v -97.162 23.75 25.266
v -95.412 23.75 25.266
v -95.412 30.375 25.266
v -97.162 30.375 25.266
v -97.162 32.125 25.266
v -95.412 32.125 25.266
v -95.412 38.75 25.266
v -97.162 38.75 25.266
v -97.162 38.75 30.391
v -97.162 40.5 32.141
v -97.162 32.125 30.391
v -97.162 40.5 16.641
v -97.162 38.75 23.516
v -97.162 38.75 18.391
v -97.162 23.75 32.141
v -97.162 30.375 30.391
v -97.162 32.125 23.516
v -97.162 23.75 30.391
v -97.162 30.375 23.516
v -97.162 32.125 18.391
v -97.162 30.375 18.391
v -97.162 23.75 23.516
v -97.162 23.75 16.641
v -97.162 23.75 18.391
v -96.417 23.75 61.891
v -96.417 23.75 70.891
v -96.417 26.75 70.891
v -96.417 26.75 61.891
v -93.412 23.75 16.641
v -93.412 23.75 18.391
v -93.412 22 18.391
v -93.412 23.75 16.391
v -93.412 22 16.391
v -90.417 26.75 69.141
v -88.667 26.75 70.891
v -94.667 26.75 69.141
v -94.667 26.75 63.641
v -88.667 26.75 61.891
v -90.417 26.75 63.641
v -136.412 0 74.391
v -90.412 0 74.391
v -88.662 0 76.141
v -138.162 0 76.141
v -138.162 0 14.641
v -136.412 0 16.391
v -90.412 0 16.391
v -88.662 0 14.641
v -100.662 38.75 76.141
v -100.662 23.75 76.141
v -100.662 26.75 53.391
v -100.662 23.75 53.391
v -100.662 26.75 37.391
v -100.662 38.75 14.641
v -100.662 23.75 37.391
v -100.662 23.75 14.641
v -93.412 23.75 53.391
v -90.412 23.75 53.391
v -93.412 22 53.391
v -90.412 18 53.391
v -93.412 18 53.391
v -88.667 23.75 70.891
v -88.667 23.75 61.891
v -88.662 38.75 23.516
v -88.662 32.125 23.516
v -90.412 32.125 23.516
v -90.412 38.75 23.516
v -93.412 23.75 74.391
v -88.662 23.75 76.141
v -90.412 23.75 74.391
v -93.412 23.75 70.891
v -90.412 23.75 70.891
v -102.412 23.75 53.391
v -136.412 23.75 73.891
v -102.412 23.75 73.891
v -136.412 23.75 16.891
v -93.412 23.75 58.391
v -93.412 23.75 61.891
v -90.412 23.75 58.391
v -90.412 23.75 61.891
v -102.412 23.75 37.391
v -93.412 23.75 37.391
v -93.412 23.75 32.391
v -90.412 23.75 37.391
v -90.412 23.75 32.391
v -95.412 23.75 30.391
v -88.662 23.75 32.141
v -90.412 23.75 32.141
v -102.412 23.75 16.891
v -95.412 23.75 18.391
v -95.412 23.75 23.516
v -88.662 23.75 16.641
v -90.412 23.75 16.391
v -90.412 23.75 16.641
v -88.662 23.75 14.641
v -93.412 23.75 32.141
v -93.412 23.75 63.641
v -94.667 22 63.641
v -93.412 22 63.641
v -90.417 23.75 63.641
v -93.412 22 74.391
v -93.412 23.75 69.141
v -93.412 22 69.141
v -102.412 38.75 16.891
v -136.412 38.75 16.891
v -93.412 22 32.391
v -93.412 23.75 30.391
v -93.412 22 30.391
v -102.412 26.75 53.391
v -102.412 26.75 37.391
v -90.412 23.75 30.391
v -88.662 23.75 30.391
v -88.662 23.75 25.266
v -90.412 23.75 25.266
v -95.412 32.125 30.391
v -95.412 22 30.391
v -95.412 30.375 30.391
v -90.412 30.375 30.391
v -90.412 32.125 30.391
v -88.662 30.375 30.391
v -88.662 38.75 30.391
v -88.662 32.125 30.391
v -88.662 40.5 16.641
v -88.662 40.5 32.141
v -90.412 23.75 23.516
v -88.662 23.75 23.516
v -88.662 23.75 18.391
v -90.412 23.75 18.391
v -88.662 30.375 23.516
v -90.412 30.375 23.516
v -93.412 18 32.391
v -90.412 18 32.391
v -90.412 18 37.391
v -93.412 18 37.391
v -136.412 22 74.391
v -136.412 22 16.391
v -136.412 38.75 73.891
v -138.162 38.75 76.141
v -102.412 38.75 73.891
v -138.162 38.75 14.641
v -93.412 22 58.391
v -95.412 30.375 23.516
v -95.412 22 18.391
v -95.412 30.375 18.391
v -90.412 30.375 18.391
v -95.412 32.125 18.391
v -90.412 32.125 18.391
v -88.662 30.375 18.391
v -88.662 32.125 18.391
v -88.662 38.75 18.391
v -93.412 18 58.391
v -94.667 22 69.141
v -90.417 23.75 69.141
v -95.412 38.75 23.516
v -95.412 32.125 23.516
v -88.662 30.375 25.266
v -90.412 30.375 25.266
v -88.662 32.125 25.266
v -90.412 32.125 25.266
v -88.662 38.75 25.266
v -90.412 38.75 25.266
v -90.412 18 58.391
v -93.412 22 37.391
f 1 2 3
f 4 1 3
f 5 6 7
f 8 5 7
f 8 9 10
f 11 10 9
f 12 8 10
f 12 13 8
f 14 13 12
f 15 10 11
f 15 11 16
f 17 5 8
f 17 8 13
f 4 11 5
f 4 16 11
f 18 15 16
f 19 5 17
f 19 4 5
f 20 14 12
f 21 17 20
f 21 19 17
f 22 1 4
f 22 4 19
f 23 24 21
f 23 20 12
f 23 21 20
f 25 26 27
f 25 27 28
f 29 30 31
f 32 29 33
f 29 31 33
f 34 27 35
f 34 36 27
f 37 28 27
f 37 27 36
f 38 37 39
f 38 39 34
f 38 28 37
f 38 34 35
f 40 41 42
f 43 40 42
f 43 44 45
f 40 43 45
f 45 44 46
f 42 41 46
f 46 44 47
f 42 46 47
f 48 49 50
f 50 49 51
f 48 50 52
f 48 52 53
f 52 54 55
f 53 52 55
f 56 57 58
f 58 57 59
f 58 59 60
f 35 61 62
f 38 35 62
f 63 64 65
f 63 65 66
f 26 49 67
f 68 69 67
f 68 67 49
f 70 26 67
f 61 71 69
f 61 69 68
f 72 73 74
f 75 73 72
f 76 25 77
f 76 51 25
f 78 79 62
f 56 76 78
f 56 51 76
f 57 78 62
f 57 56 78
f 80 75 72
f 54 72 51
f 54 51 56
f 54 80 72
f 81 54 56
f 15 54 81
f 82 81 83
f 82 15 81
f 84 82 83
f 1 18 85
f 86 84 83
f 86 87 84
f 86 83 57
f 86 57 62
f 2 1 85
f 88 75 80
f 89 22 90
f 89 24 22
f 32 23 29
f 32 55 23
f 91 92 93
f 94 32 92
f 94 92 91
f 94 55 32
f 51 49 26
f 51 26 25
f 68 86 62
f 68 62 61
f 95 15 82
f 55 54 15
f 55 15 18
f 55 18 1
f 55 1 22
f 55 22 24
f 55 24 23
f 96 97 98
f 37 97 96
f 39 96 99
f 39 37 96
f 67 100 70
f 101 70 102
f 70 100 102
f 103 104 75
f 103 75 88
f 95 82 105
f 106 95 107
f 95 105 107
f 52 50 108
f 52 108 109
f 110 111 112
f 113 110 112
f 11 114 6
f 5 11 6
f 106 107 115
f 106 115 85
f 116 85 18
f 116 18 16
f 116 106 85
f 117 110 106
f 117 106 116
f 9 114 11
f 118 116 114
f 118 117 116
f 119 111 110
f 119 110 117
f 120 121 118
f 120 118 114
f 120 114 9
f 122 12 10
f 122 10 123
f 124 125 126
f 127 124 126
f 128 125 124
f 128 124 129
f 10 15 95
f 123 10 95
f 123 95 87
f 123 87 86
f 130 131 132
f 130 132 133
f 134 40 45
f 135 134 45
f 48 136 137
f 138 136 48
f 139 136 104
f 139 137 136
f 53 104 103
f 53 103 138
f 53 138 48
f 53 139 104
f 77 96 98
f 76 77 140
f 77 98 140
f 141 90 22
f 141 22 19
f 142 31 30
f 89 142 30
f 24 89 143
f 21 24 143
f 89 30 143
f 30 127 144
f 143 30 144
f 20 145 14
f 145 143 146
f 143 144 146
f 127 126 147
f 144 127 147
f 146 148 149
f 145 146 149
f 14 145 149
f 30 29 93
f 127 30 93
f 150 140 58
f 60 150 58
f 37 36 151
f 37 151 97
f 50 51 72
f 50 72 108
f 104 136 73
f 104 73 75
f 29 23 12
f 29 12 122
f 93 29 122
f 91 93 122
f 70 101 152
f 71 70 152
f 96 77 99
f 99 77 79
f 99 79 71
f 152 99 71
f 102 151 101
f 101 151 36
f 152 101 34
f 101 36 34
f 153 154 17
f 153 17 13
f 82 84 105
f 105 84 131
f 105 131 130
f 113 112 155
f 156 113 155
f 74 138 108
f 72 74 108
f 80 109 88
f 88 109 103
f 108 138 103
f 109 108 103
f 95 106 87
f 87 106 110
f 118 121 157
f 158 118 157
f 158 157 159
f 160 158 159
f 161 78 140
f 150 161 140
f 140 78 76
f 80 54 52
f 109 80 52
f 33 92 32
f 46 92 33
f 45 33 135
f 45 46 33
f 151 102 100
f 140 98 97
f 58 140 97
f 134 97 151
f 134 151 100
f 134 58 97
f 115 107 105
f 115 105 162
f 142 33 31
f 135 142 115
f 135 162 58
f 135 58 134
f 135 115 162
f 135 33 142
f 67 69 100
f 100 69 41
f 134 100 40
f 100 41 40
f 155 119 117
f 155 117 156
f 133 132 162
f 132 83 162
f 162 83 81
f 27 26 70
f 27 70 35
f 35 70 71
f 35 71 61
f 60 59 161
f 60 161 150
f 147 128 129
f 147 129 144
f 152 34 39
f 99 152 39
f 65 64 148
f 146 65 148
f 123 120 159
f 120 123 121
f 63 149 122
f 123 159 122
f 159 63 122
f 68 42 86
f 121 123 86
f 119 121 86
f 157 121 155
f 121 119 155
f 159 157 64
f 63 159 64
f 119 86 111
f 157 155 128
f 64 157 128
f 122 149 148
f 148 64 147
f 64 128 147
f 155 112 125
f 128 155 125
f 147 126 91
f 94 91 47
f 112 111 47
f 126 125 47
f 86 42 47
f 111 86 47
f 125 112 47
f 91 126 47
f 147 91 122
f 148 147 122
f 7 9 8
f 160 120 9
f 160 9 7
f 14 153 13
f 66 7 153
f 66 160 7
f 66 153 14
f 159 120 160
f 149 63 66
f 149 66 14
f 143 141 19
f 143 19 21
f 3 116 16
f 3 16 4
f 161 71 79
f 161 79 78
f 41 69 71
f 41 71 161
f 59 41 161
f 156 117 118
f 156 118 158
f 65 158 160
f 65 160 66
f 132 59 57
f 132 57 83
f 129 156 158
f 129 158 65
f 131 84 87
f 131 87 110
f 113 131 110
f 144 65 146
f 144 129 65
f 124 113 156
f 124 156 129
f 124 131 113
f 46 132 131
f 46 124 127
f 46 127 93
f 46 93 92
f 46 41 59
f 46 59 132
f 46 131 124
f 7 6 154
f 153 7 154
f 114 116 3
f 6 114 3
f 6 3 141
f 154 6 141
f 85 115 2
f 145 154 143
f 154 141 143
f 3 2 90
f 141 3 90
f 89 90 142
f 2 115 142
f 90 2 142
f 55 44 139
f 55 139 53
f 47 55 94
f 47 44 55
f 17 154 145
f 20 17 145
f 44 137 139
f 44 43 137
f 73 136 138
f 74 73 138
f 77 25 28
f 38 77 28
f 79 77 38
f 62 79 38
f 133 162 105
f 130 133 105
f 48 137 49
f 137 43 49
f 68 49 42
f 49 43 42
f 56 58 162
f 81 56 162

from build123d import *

# Parameters (mm, degrees)
SKETCH1_W               = 49.5
SKETCH1_H               = 61.5
BOSS_EXTRUDE1_DEPTH     = 23.75
SKETCH2_W               = 46
SKETCH2_H               = 58
CUT_EXTRUDE1_DEPTH      = 22
SKETCH3_W               = 3
SKETCH3_H               = 16
CUT_EXTRUDE2_DEPTH      = 1.75
SKETCH7_W               = 3
SKETCH7_H               = 5
BOSS_EXTRUDE2_DEPTH     = 4
SKETCH11_W              = 37.5
SKETCH11_H              = 61.5
BOSS_EXTRUDE3_DEPTH     = 15
SKETCH12_W              = 34
SKETCH12_H              = 57
CUT_EXTRUDE3_DEPTH      = 15
SKETCH14_W              = 7.75
SKETCH14_H              = 9
BOSS_EXTRUDE4_DEPTH     = 3
SKETCH15_W              = 4.25
SKETCH15_H              = 5.5
CUT_EXTRUDE4_DEPTH      = 4.75
SKETCH16_W              = 8.5
SKETCH16_H              = 15.5
BOSS_EXTRUDE5_DEPTH     = 16.75
SKETCH17_W              = 5.125
SKETCH17_H              = 6.625
CUT_EXTRUDE5_DEPTH      = 8.5
CUT_EXTRUDE6_DEPTH      = 15
CUT_EXTRUDE6_DEPTH_BACK = 1.75
SKETCH18_W              = 5
SKETCH18_H              = 12
SKETCH20_W              = 16
SKETCH20_H              = 3
CUT_EXTRUDE7_DEPTH      = 1.75


with BuildPart() as part:
    # Sketch1 → Boss-Extrude1 (new body)
    with BuildSketch(Plane(origin=(0, 0, 0), x_dir=(1, 0, 0), z_dir=(0, 1, 0))):
        with Locations((-113.412024913, -45.391200727)):
            Rectangle(SKETCH1_W, SKETCH1_H)
    extrude(amount=BOSS_EXTRUDE1_DEPTH)

    # Sketch2 → Cut-Extrude1 (cut)
    with BuildSketch(Plane(origin=(0, 0, 0), x_dir=(-1, 0, 0), z_dir=(0, -1, 0))):
        with Locations((113.412024913, -45.391200727)):
            Rectangle(SKETCH2_W, SKETCH2_H)
    extrude(amount=-CUT_EXTRUDE1_DEPTH, mode=Mode.SUBTRACT)

    # Sketch3 → Cut-Extrude2 (cut)
    with BuildSketch(Plane(origin=(0, 22, 0), x_dir=(-1, 0, 0), z_dir=(0, -1, 0))):
        with Locations((91.912024913, -66.391200727)):
            Rectangle(SKETCH3_W, SKETCH3_H)
        with Locations((91.912024913, -24.391200727)):
            Rectangle(SKETCH3_W, SKETCH3_H)
        with Locations((91.912024913, -45.391200727)):
            Rectangle(SKETCH3_W, SKETCH3_H)
    extrude(amount=-CUT_EXTRUDE2_DEPTH, mode=Mode.SUBTRACT)

    # Sketch7 → Boss-Extrude2 (add)
    with BuildSketch(Plane(origin=(0, 22, 0), x_dir=(-1, 0, 0), z_dir=(0, -1, 0))):
        with Locations((91.912024913, -55.891200727)):
            Rectangle(SKETCH7_W, SKETCH7_H)
        with Locations((91.912024913, -34.891200727)):
            Rectangle(SKETCH7_W, SKETCH7_H)
    extrude(amount=BOSS_EXTRUDE2_DEPTH)

    # Sketch11 → Boss-Extrude3 (add)
    with BuildSketch(Plane(origin=(0, 23.75, 0), x_dir=(1, 0, 0), z_dir=(0, 1, 0))):
        with Locations((-119.412024913, -45.391200727)):
            Rectangle(SKETCH11_W, SKETCH11_H)
    extrude(amount=BOSS_EXTRUDE3_DEPTH)

    # Sketch12 → Cut-Extrude3 (cut)
    with BuildSketch(Plane(origin=(0, 38.75, 0), x_dir=(1, 0, 0), z_dir=(0, 1, 0))):
        with Locations((-119.412024913, -45.391200727)):
            Rectangle(SKETCH12_W, SKETCH12_H)
    extrude(amount=-CUT_EXTRUDE3_DEPTH, mode=Mode.SUBTRACT)

    # Sketch14 → Boss-Extrude4 (add)
    with BuildSketch(Plane(origin=(0, 23.75, 0), x_dir=(1, 0, 0), z_dir=(0, 1, 0))):
        with Locations((-92.542024913, -66.391200727)):
            Rectangle(SKETCH14_W, SKETCH14_H)
    extrude(amount=BOSS_EXTRUDE4_DEPTH)

    # Sketch15 → Cut-Extrude4 (cut)
    with BuildSketch(Plane(origin=(0, 26.75, 0), x_dir=(1, 0, 0), z_dir=(0, 1, 0))):
        with Locations((-92.542024913, -66.391200727)):
            Rectangle(SKETCH15_W, SKETCH15_H)
    extrude(amount=-CUT_EXTRUDE4_DEPTH, mode=Mode.SUBTRACT)

    # Sketch16 → Boss-Extrude5 (add)
    with BuildSketch(Plane(origin=(0, 23.75, 0), x_dir=(1, 0, 0), z_dir=(0, 1, 0))):
        with Locations((-92.912024913, -24.391200727)):
            Rectangle(SKETCH16_W, SKETCH16_H)
    extrude(amount=BOSS_EXTRUDE5_DEPTH)

    # Sketch17 → Cut-Extrude5 (cut)
    with BuildSketch(Plane(origin=(-88.662024913, 0, 0), x_dir=(0, 0, -1), z_dir=(1, 0, 0))):
        with Locations((-27.828700727, 35.4375)):
            Rectangle(SKETCH17_W, SKETCH17_H)
        with Locations((-27.828700727, 27.0625)):
            Rectangle(SKETCH17_W, SKETCH17_H)
        with Locations((-20.953700727, 35.4375)):
            Rectangle(SKETCH17_W, SKETCH17_H)
        with Locations((-20.953700727, 27.0625)):
            Rectangle(SKETCH17_W, SKETCH17_H)
    extrude(amount=-CUT_EXTRUDE5_DEPTH, mode=Mode.SUBTRACT)

    # Sketch18 → Cut-Extrude6 (cut, two sides: drawn at the far end of the back side and taken through both)
    with BuildSketch(Plane(origin=(0, 23.75, 0), x_dir=(1, 0, 0), z_dir=(0, 1, 0)).offset(-CUT_EXTRUDE6_DEPTH_BACK)):
        with Locations((-92.912024913, -24.391200727)):
            Rectangle(SKETCH18_W, SKETCH18_H)
    extrude(amount=CUT_EXTRUDE6_DEPTH + CUT_EXTRUDE6_DEPTH_BACK, mode=Mode.SUBTRACT)

    # Sketch20 → Cut-Extrude7 (cut)
    with BuildSketch(Plane(origin=(-100.662024913, 0, 0), x_dir=(0, 0, -1), z_dir=(1, 0, 0))):
        with Locations((-45.391200727, 25.25)):
            Rectangle(SKETCH20_W, SKETCH20_H)
    extrude(amount=-CUT_EXTRUDE7_DEPTH, mode=Mode.SUBTRACT)


solid = part.part
